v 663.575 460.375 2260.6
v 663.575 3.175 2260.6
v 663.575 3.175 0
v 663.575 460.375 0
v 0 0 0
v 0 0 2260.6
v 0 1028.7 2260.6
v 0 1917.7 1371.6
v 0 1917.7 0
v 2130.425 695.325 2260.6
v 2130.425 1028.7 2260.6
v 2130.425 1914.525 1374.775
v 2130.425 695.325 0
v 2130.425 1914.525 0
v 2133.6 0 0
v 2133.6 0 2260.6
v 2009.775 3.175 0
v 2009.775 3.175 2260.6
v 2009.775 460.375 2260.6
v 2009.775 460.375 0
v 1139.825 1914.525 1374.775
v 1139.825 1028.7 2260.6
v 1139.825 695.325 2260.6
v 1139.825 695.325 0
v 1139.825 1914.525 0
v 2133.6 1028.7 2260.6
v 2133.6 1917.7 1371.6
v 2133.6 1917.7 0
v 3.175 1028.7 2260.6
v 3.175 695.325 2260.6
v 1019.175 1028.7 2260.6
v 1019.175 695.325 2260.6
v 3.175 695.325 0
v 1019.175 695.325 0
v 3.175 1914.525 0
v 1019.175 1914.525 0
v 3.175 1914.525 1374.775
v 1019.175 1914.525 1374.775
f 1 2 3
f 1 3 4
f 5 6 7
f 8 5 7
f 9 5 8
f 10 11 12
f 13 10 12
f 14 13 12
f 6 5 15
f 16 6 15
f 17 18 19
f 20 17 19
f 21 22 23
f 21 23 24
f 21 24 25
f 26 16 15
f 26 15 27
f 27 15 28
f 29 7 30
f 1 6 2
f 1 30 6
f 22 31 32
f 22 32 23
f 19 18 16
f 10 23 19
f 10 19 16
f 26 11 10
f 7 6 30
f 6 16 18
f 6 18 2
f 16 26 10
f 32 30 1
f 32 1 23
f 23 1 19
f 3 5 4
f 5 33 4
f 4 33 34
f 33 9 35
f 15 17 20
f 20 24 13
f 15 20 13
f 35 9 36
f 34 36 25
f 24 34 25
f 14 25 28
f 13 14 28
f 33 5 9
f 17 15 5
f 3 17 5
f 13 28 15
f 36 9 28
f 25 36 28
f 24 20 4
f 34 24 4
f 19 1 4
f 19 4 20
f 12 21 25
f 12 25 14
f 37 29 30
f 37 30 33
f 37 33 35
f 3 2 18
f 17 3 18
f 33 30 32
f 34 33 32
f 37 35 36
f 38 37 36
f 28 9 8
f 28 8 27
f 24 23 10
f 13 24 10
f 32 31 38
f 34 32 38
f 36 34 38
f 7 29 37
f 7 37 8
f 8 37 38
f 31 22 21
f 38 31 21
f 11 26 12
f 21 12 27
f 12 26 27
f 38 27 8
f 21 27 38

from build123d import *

# Parameters (mm, degrees)
F0_W     = 2133.6
F0_H     = 1917.7
F1_DEPTH = 2260.6
F2_W     = 990.6
F2_H     = 1219.2
F2_W_2   = 1016
F3_DEPTH = 2260.601
F4_W     = 1346.2
F4_H     = 457.2
F5_DEPTH = 2260.601
F7_DEPTH = 2133.601


with BuildPart() as f1:
    # F0 (on Top) → F1 (new body)
    with BuildSketch(Plane.XY):
        with Locations((1066.8, 958.85)):
            Rectangle(F0_W, F0_H)
    extrude(amount=F1_DEPTH)

    # F2 (on face) → F3 (cut, through all)
    with BuildSketch(Plane.XY.offset(2260.6)):
        with Locations((1635.125, 1304.925)):
            Rectangle(F2_W, F2_H)
        with Locations((511.175, 1304.925)):
            Rectangle(F2_W_2, F2_H)
    extrude(amount=-F3_DEPTH, mode=Mode.SUBTRACT)

    # F4 (on face) → F5 (cut, through all)
    with BuildSketch(Plane.XY.offset(2260.6)):
        with Locations((1336.675, 231.775)):
            Rectangle(F4_W, F4_H)
    extrude(amount=-F5_DEPTH, mode=Mode.SUBTRACT)

    # F6 (on face) → F7 (cut, through all)
    with BuildSketch(Plane.YZ.offset(2133.6)):
        Polygon((1917.7, 1371.6), (1917.7, 2260.6), (1028.7, 2260.6), align=None)
    extrude(amount=-F7_DEPTH, mode=Mode.SUBTRACT)


solid = f1.part
